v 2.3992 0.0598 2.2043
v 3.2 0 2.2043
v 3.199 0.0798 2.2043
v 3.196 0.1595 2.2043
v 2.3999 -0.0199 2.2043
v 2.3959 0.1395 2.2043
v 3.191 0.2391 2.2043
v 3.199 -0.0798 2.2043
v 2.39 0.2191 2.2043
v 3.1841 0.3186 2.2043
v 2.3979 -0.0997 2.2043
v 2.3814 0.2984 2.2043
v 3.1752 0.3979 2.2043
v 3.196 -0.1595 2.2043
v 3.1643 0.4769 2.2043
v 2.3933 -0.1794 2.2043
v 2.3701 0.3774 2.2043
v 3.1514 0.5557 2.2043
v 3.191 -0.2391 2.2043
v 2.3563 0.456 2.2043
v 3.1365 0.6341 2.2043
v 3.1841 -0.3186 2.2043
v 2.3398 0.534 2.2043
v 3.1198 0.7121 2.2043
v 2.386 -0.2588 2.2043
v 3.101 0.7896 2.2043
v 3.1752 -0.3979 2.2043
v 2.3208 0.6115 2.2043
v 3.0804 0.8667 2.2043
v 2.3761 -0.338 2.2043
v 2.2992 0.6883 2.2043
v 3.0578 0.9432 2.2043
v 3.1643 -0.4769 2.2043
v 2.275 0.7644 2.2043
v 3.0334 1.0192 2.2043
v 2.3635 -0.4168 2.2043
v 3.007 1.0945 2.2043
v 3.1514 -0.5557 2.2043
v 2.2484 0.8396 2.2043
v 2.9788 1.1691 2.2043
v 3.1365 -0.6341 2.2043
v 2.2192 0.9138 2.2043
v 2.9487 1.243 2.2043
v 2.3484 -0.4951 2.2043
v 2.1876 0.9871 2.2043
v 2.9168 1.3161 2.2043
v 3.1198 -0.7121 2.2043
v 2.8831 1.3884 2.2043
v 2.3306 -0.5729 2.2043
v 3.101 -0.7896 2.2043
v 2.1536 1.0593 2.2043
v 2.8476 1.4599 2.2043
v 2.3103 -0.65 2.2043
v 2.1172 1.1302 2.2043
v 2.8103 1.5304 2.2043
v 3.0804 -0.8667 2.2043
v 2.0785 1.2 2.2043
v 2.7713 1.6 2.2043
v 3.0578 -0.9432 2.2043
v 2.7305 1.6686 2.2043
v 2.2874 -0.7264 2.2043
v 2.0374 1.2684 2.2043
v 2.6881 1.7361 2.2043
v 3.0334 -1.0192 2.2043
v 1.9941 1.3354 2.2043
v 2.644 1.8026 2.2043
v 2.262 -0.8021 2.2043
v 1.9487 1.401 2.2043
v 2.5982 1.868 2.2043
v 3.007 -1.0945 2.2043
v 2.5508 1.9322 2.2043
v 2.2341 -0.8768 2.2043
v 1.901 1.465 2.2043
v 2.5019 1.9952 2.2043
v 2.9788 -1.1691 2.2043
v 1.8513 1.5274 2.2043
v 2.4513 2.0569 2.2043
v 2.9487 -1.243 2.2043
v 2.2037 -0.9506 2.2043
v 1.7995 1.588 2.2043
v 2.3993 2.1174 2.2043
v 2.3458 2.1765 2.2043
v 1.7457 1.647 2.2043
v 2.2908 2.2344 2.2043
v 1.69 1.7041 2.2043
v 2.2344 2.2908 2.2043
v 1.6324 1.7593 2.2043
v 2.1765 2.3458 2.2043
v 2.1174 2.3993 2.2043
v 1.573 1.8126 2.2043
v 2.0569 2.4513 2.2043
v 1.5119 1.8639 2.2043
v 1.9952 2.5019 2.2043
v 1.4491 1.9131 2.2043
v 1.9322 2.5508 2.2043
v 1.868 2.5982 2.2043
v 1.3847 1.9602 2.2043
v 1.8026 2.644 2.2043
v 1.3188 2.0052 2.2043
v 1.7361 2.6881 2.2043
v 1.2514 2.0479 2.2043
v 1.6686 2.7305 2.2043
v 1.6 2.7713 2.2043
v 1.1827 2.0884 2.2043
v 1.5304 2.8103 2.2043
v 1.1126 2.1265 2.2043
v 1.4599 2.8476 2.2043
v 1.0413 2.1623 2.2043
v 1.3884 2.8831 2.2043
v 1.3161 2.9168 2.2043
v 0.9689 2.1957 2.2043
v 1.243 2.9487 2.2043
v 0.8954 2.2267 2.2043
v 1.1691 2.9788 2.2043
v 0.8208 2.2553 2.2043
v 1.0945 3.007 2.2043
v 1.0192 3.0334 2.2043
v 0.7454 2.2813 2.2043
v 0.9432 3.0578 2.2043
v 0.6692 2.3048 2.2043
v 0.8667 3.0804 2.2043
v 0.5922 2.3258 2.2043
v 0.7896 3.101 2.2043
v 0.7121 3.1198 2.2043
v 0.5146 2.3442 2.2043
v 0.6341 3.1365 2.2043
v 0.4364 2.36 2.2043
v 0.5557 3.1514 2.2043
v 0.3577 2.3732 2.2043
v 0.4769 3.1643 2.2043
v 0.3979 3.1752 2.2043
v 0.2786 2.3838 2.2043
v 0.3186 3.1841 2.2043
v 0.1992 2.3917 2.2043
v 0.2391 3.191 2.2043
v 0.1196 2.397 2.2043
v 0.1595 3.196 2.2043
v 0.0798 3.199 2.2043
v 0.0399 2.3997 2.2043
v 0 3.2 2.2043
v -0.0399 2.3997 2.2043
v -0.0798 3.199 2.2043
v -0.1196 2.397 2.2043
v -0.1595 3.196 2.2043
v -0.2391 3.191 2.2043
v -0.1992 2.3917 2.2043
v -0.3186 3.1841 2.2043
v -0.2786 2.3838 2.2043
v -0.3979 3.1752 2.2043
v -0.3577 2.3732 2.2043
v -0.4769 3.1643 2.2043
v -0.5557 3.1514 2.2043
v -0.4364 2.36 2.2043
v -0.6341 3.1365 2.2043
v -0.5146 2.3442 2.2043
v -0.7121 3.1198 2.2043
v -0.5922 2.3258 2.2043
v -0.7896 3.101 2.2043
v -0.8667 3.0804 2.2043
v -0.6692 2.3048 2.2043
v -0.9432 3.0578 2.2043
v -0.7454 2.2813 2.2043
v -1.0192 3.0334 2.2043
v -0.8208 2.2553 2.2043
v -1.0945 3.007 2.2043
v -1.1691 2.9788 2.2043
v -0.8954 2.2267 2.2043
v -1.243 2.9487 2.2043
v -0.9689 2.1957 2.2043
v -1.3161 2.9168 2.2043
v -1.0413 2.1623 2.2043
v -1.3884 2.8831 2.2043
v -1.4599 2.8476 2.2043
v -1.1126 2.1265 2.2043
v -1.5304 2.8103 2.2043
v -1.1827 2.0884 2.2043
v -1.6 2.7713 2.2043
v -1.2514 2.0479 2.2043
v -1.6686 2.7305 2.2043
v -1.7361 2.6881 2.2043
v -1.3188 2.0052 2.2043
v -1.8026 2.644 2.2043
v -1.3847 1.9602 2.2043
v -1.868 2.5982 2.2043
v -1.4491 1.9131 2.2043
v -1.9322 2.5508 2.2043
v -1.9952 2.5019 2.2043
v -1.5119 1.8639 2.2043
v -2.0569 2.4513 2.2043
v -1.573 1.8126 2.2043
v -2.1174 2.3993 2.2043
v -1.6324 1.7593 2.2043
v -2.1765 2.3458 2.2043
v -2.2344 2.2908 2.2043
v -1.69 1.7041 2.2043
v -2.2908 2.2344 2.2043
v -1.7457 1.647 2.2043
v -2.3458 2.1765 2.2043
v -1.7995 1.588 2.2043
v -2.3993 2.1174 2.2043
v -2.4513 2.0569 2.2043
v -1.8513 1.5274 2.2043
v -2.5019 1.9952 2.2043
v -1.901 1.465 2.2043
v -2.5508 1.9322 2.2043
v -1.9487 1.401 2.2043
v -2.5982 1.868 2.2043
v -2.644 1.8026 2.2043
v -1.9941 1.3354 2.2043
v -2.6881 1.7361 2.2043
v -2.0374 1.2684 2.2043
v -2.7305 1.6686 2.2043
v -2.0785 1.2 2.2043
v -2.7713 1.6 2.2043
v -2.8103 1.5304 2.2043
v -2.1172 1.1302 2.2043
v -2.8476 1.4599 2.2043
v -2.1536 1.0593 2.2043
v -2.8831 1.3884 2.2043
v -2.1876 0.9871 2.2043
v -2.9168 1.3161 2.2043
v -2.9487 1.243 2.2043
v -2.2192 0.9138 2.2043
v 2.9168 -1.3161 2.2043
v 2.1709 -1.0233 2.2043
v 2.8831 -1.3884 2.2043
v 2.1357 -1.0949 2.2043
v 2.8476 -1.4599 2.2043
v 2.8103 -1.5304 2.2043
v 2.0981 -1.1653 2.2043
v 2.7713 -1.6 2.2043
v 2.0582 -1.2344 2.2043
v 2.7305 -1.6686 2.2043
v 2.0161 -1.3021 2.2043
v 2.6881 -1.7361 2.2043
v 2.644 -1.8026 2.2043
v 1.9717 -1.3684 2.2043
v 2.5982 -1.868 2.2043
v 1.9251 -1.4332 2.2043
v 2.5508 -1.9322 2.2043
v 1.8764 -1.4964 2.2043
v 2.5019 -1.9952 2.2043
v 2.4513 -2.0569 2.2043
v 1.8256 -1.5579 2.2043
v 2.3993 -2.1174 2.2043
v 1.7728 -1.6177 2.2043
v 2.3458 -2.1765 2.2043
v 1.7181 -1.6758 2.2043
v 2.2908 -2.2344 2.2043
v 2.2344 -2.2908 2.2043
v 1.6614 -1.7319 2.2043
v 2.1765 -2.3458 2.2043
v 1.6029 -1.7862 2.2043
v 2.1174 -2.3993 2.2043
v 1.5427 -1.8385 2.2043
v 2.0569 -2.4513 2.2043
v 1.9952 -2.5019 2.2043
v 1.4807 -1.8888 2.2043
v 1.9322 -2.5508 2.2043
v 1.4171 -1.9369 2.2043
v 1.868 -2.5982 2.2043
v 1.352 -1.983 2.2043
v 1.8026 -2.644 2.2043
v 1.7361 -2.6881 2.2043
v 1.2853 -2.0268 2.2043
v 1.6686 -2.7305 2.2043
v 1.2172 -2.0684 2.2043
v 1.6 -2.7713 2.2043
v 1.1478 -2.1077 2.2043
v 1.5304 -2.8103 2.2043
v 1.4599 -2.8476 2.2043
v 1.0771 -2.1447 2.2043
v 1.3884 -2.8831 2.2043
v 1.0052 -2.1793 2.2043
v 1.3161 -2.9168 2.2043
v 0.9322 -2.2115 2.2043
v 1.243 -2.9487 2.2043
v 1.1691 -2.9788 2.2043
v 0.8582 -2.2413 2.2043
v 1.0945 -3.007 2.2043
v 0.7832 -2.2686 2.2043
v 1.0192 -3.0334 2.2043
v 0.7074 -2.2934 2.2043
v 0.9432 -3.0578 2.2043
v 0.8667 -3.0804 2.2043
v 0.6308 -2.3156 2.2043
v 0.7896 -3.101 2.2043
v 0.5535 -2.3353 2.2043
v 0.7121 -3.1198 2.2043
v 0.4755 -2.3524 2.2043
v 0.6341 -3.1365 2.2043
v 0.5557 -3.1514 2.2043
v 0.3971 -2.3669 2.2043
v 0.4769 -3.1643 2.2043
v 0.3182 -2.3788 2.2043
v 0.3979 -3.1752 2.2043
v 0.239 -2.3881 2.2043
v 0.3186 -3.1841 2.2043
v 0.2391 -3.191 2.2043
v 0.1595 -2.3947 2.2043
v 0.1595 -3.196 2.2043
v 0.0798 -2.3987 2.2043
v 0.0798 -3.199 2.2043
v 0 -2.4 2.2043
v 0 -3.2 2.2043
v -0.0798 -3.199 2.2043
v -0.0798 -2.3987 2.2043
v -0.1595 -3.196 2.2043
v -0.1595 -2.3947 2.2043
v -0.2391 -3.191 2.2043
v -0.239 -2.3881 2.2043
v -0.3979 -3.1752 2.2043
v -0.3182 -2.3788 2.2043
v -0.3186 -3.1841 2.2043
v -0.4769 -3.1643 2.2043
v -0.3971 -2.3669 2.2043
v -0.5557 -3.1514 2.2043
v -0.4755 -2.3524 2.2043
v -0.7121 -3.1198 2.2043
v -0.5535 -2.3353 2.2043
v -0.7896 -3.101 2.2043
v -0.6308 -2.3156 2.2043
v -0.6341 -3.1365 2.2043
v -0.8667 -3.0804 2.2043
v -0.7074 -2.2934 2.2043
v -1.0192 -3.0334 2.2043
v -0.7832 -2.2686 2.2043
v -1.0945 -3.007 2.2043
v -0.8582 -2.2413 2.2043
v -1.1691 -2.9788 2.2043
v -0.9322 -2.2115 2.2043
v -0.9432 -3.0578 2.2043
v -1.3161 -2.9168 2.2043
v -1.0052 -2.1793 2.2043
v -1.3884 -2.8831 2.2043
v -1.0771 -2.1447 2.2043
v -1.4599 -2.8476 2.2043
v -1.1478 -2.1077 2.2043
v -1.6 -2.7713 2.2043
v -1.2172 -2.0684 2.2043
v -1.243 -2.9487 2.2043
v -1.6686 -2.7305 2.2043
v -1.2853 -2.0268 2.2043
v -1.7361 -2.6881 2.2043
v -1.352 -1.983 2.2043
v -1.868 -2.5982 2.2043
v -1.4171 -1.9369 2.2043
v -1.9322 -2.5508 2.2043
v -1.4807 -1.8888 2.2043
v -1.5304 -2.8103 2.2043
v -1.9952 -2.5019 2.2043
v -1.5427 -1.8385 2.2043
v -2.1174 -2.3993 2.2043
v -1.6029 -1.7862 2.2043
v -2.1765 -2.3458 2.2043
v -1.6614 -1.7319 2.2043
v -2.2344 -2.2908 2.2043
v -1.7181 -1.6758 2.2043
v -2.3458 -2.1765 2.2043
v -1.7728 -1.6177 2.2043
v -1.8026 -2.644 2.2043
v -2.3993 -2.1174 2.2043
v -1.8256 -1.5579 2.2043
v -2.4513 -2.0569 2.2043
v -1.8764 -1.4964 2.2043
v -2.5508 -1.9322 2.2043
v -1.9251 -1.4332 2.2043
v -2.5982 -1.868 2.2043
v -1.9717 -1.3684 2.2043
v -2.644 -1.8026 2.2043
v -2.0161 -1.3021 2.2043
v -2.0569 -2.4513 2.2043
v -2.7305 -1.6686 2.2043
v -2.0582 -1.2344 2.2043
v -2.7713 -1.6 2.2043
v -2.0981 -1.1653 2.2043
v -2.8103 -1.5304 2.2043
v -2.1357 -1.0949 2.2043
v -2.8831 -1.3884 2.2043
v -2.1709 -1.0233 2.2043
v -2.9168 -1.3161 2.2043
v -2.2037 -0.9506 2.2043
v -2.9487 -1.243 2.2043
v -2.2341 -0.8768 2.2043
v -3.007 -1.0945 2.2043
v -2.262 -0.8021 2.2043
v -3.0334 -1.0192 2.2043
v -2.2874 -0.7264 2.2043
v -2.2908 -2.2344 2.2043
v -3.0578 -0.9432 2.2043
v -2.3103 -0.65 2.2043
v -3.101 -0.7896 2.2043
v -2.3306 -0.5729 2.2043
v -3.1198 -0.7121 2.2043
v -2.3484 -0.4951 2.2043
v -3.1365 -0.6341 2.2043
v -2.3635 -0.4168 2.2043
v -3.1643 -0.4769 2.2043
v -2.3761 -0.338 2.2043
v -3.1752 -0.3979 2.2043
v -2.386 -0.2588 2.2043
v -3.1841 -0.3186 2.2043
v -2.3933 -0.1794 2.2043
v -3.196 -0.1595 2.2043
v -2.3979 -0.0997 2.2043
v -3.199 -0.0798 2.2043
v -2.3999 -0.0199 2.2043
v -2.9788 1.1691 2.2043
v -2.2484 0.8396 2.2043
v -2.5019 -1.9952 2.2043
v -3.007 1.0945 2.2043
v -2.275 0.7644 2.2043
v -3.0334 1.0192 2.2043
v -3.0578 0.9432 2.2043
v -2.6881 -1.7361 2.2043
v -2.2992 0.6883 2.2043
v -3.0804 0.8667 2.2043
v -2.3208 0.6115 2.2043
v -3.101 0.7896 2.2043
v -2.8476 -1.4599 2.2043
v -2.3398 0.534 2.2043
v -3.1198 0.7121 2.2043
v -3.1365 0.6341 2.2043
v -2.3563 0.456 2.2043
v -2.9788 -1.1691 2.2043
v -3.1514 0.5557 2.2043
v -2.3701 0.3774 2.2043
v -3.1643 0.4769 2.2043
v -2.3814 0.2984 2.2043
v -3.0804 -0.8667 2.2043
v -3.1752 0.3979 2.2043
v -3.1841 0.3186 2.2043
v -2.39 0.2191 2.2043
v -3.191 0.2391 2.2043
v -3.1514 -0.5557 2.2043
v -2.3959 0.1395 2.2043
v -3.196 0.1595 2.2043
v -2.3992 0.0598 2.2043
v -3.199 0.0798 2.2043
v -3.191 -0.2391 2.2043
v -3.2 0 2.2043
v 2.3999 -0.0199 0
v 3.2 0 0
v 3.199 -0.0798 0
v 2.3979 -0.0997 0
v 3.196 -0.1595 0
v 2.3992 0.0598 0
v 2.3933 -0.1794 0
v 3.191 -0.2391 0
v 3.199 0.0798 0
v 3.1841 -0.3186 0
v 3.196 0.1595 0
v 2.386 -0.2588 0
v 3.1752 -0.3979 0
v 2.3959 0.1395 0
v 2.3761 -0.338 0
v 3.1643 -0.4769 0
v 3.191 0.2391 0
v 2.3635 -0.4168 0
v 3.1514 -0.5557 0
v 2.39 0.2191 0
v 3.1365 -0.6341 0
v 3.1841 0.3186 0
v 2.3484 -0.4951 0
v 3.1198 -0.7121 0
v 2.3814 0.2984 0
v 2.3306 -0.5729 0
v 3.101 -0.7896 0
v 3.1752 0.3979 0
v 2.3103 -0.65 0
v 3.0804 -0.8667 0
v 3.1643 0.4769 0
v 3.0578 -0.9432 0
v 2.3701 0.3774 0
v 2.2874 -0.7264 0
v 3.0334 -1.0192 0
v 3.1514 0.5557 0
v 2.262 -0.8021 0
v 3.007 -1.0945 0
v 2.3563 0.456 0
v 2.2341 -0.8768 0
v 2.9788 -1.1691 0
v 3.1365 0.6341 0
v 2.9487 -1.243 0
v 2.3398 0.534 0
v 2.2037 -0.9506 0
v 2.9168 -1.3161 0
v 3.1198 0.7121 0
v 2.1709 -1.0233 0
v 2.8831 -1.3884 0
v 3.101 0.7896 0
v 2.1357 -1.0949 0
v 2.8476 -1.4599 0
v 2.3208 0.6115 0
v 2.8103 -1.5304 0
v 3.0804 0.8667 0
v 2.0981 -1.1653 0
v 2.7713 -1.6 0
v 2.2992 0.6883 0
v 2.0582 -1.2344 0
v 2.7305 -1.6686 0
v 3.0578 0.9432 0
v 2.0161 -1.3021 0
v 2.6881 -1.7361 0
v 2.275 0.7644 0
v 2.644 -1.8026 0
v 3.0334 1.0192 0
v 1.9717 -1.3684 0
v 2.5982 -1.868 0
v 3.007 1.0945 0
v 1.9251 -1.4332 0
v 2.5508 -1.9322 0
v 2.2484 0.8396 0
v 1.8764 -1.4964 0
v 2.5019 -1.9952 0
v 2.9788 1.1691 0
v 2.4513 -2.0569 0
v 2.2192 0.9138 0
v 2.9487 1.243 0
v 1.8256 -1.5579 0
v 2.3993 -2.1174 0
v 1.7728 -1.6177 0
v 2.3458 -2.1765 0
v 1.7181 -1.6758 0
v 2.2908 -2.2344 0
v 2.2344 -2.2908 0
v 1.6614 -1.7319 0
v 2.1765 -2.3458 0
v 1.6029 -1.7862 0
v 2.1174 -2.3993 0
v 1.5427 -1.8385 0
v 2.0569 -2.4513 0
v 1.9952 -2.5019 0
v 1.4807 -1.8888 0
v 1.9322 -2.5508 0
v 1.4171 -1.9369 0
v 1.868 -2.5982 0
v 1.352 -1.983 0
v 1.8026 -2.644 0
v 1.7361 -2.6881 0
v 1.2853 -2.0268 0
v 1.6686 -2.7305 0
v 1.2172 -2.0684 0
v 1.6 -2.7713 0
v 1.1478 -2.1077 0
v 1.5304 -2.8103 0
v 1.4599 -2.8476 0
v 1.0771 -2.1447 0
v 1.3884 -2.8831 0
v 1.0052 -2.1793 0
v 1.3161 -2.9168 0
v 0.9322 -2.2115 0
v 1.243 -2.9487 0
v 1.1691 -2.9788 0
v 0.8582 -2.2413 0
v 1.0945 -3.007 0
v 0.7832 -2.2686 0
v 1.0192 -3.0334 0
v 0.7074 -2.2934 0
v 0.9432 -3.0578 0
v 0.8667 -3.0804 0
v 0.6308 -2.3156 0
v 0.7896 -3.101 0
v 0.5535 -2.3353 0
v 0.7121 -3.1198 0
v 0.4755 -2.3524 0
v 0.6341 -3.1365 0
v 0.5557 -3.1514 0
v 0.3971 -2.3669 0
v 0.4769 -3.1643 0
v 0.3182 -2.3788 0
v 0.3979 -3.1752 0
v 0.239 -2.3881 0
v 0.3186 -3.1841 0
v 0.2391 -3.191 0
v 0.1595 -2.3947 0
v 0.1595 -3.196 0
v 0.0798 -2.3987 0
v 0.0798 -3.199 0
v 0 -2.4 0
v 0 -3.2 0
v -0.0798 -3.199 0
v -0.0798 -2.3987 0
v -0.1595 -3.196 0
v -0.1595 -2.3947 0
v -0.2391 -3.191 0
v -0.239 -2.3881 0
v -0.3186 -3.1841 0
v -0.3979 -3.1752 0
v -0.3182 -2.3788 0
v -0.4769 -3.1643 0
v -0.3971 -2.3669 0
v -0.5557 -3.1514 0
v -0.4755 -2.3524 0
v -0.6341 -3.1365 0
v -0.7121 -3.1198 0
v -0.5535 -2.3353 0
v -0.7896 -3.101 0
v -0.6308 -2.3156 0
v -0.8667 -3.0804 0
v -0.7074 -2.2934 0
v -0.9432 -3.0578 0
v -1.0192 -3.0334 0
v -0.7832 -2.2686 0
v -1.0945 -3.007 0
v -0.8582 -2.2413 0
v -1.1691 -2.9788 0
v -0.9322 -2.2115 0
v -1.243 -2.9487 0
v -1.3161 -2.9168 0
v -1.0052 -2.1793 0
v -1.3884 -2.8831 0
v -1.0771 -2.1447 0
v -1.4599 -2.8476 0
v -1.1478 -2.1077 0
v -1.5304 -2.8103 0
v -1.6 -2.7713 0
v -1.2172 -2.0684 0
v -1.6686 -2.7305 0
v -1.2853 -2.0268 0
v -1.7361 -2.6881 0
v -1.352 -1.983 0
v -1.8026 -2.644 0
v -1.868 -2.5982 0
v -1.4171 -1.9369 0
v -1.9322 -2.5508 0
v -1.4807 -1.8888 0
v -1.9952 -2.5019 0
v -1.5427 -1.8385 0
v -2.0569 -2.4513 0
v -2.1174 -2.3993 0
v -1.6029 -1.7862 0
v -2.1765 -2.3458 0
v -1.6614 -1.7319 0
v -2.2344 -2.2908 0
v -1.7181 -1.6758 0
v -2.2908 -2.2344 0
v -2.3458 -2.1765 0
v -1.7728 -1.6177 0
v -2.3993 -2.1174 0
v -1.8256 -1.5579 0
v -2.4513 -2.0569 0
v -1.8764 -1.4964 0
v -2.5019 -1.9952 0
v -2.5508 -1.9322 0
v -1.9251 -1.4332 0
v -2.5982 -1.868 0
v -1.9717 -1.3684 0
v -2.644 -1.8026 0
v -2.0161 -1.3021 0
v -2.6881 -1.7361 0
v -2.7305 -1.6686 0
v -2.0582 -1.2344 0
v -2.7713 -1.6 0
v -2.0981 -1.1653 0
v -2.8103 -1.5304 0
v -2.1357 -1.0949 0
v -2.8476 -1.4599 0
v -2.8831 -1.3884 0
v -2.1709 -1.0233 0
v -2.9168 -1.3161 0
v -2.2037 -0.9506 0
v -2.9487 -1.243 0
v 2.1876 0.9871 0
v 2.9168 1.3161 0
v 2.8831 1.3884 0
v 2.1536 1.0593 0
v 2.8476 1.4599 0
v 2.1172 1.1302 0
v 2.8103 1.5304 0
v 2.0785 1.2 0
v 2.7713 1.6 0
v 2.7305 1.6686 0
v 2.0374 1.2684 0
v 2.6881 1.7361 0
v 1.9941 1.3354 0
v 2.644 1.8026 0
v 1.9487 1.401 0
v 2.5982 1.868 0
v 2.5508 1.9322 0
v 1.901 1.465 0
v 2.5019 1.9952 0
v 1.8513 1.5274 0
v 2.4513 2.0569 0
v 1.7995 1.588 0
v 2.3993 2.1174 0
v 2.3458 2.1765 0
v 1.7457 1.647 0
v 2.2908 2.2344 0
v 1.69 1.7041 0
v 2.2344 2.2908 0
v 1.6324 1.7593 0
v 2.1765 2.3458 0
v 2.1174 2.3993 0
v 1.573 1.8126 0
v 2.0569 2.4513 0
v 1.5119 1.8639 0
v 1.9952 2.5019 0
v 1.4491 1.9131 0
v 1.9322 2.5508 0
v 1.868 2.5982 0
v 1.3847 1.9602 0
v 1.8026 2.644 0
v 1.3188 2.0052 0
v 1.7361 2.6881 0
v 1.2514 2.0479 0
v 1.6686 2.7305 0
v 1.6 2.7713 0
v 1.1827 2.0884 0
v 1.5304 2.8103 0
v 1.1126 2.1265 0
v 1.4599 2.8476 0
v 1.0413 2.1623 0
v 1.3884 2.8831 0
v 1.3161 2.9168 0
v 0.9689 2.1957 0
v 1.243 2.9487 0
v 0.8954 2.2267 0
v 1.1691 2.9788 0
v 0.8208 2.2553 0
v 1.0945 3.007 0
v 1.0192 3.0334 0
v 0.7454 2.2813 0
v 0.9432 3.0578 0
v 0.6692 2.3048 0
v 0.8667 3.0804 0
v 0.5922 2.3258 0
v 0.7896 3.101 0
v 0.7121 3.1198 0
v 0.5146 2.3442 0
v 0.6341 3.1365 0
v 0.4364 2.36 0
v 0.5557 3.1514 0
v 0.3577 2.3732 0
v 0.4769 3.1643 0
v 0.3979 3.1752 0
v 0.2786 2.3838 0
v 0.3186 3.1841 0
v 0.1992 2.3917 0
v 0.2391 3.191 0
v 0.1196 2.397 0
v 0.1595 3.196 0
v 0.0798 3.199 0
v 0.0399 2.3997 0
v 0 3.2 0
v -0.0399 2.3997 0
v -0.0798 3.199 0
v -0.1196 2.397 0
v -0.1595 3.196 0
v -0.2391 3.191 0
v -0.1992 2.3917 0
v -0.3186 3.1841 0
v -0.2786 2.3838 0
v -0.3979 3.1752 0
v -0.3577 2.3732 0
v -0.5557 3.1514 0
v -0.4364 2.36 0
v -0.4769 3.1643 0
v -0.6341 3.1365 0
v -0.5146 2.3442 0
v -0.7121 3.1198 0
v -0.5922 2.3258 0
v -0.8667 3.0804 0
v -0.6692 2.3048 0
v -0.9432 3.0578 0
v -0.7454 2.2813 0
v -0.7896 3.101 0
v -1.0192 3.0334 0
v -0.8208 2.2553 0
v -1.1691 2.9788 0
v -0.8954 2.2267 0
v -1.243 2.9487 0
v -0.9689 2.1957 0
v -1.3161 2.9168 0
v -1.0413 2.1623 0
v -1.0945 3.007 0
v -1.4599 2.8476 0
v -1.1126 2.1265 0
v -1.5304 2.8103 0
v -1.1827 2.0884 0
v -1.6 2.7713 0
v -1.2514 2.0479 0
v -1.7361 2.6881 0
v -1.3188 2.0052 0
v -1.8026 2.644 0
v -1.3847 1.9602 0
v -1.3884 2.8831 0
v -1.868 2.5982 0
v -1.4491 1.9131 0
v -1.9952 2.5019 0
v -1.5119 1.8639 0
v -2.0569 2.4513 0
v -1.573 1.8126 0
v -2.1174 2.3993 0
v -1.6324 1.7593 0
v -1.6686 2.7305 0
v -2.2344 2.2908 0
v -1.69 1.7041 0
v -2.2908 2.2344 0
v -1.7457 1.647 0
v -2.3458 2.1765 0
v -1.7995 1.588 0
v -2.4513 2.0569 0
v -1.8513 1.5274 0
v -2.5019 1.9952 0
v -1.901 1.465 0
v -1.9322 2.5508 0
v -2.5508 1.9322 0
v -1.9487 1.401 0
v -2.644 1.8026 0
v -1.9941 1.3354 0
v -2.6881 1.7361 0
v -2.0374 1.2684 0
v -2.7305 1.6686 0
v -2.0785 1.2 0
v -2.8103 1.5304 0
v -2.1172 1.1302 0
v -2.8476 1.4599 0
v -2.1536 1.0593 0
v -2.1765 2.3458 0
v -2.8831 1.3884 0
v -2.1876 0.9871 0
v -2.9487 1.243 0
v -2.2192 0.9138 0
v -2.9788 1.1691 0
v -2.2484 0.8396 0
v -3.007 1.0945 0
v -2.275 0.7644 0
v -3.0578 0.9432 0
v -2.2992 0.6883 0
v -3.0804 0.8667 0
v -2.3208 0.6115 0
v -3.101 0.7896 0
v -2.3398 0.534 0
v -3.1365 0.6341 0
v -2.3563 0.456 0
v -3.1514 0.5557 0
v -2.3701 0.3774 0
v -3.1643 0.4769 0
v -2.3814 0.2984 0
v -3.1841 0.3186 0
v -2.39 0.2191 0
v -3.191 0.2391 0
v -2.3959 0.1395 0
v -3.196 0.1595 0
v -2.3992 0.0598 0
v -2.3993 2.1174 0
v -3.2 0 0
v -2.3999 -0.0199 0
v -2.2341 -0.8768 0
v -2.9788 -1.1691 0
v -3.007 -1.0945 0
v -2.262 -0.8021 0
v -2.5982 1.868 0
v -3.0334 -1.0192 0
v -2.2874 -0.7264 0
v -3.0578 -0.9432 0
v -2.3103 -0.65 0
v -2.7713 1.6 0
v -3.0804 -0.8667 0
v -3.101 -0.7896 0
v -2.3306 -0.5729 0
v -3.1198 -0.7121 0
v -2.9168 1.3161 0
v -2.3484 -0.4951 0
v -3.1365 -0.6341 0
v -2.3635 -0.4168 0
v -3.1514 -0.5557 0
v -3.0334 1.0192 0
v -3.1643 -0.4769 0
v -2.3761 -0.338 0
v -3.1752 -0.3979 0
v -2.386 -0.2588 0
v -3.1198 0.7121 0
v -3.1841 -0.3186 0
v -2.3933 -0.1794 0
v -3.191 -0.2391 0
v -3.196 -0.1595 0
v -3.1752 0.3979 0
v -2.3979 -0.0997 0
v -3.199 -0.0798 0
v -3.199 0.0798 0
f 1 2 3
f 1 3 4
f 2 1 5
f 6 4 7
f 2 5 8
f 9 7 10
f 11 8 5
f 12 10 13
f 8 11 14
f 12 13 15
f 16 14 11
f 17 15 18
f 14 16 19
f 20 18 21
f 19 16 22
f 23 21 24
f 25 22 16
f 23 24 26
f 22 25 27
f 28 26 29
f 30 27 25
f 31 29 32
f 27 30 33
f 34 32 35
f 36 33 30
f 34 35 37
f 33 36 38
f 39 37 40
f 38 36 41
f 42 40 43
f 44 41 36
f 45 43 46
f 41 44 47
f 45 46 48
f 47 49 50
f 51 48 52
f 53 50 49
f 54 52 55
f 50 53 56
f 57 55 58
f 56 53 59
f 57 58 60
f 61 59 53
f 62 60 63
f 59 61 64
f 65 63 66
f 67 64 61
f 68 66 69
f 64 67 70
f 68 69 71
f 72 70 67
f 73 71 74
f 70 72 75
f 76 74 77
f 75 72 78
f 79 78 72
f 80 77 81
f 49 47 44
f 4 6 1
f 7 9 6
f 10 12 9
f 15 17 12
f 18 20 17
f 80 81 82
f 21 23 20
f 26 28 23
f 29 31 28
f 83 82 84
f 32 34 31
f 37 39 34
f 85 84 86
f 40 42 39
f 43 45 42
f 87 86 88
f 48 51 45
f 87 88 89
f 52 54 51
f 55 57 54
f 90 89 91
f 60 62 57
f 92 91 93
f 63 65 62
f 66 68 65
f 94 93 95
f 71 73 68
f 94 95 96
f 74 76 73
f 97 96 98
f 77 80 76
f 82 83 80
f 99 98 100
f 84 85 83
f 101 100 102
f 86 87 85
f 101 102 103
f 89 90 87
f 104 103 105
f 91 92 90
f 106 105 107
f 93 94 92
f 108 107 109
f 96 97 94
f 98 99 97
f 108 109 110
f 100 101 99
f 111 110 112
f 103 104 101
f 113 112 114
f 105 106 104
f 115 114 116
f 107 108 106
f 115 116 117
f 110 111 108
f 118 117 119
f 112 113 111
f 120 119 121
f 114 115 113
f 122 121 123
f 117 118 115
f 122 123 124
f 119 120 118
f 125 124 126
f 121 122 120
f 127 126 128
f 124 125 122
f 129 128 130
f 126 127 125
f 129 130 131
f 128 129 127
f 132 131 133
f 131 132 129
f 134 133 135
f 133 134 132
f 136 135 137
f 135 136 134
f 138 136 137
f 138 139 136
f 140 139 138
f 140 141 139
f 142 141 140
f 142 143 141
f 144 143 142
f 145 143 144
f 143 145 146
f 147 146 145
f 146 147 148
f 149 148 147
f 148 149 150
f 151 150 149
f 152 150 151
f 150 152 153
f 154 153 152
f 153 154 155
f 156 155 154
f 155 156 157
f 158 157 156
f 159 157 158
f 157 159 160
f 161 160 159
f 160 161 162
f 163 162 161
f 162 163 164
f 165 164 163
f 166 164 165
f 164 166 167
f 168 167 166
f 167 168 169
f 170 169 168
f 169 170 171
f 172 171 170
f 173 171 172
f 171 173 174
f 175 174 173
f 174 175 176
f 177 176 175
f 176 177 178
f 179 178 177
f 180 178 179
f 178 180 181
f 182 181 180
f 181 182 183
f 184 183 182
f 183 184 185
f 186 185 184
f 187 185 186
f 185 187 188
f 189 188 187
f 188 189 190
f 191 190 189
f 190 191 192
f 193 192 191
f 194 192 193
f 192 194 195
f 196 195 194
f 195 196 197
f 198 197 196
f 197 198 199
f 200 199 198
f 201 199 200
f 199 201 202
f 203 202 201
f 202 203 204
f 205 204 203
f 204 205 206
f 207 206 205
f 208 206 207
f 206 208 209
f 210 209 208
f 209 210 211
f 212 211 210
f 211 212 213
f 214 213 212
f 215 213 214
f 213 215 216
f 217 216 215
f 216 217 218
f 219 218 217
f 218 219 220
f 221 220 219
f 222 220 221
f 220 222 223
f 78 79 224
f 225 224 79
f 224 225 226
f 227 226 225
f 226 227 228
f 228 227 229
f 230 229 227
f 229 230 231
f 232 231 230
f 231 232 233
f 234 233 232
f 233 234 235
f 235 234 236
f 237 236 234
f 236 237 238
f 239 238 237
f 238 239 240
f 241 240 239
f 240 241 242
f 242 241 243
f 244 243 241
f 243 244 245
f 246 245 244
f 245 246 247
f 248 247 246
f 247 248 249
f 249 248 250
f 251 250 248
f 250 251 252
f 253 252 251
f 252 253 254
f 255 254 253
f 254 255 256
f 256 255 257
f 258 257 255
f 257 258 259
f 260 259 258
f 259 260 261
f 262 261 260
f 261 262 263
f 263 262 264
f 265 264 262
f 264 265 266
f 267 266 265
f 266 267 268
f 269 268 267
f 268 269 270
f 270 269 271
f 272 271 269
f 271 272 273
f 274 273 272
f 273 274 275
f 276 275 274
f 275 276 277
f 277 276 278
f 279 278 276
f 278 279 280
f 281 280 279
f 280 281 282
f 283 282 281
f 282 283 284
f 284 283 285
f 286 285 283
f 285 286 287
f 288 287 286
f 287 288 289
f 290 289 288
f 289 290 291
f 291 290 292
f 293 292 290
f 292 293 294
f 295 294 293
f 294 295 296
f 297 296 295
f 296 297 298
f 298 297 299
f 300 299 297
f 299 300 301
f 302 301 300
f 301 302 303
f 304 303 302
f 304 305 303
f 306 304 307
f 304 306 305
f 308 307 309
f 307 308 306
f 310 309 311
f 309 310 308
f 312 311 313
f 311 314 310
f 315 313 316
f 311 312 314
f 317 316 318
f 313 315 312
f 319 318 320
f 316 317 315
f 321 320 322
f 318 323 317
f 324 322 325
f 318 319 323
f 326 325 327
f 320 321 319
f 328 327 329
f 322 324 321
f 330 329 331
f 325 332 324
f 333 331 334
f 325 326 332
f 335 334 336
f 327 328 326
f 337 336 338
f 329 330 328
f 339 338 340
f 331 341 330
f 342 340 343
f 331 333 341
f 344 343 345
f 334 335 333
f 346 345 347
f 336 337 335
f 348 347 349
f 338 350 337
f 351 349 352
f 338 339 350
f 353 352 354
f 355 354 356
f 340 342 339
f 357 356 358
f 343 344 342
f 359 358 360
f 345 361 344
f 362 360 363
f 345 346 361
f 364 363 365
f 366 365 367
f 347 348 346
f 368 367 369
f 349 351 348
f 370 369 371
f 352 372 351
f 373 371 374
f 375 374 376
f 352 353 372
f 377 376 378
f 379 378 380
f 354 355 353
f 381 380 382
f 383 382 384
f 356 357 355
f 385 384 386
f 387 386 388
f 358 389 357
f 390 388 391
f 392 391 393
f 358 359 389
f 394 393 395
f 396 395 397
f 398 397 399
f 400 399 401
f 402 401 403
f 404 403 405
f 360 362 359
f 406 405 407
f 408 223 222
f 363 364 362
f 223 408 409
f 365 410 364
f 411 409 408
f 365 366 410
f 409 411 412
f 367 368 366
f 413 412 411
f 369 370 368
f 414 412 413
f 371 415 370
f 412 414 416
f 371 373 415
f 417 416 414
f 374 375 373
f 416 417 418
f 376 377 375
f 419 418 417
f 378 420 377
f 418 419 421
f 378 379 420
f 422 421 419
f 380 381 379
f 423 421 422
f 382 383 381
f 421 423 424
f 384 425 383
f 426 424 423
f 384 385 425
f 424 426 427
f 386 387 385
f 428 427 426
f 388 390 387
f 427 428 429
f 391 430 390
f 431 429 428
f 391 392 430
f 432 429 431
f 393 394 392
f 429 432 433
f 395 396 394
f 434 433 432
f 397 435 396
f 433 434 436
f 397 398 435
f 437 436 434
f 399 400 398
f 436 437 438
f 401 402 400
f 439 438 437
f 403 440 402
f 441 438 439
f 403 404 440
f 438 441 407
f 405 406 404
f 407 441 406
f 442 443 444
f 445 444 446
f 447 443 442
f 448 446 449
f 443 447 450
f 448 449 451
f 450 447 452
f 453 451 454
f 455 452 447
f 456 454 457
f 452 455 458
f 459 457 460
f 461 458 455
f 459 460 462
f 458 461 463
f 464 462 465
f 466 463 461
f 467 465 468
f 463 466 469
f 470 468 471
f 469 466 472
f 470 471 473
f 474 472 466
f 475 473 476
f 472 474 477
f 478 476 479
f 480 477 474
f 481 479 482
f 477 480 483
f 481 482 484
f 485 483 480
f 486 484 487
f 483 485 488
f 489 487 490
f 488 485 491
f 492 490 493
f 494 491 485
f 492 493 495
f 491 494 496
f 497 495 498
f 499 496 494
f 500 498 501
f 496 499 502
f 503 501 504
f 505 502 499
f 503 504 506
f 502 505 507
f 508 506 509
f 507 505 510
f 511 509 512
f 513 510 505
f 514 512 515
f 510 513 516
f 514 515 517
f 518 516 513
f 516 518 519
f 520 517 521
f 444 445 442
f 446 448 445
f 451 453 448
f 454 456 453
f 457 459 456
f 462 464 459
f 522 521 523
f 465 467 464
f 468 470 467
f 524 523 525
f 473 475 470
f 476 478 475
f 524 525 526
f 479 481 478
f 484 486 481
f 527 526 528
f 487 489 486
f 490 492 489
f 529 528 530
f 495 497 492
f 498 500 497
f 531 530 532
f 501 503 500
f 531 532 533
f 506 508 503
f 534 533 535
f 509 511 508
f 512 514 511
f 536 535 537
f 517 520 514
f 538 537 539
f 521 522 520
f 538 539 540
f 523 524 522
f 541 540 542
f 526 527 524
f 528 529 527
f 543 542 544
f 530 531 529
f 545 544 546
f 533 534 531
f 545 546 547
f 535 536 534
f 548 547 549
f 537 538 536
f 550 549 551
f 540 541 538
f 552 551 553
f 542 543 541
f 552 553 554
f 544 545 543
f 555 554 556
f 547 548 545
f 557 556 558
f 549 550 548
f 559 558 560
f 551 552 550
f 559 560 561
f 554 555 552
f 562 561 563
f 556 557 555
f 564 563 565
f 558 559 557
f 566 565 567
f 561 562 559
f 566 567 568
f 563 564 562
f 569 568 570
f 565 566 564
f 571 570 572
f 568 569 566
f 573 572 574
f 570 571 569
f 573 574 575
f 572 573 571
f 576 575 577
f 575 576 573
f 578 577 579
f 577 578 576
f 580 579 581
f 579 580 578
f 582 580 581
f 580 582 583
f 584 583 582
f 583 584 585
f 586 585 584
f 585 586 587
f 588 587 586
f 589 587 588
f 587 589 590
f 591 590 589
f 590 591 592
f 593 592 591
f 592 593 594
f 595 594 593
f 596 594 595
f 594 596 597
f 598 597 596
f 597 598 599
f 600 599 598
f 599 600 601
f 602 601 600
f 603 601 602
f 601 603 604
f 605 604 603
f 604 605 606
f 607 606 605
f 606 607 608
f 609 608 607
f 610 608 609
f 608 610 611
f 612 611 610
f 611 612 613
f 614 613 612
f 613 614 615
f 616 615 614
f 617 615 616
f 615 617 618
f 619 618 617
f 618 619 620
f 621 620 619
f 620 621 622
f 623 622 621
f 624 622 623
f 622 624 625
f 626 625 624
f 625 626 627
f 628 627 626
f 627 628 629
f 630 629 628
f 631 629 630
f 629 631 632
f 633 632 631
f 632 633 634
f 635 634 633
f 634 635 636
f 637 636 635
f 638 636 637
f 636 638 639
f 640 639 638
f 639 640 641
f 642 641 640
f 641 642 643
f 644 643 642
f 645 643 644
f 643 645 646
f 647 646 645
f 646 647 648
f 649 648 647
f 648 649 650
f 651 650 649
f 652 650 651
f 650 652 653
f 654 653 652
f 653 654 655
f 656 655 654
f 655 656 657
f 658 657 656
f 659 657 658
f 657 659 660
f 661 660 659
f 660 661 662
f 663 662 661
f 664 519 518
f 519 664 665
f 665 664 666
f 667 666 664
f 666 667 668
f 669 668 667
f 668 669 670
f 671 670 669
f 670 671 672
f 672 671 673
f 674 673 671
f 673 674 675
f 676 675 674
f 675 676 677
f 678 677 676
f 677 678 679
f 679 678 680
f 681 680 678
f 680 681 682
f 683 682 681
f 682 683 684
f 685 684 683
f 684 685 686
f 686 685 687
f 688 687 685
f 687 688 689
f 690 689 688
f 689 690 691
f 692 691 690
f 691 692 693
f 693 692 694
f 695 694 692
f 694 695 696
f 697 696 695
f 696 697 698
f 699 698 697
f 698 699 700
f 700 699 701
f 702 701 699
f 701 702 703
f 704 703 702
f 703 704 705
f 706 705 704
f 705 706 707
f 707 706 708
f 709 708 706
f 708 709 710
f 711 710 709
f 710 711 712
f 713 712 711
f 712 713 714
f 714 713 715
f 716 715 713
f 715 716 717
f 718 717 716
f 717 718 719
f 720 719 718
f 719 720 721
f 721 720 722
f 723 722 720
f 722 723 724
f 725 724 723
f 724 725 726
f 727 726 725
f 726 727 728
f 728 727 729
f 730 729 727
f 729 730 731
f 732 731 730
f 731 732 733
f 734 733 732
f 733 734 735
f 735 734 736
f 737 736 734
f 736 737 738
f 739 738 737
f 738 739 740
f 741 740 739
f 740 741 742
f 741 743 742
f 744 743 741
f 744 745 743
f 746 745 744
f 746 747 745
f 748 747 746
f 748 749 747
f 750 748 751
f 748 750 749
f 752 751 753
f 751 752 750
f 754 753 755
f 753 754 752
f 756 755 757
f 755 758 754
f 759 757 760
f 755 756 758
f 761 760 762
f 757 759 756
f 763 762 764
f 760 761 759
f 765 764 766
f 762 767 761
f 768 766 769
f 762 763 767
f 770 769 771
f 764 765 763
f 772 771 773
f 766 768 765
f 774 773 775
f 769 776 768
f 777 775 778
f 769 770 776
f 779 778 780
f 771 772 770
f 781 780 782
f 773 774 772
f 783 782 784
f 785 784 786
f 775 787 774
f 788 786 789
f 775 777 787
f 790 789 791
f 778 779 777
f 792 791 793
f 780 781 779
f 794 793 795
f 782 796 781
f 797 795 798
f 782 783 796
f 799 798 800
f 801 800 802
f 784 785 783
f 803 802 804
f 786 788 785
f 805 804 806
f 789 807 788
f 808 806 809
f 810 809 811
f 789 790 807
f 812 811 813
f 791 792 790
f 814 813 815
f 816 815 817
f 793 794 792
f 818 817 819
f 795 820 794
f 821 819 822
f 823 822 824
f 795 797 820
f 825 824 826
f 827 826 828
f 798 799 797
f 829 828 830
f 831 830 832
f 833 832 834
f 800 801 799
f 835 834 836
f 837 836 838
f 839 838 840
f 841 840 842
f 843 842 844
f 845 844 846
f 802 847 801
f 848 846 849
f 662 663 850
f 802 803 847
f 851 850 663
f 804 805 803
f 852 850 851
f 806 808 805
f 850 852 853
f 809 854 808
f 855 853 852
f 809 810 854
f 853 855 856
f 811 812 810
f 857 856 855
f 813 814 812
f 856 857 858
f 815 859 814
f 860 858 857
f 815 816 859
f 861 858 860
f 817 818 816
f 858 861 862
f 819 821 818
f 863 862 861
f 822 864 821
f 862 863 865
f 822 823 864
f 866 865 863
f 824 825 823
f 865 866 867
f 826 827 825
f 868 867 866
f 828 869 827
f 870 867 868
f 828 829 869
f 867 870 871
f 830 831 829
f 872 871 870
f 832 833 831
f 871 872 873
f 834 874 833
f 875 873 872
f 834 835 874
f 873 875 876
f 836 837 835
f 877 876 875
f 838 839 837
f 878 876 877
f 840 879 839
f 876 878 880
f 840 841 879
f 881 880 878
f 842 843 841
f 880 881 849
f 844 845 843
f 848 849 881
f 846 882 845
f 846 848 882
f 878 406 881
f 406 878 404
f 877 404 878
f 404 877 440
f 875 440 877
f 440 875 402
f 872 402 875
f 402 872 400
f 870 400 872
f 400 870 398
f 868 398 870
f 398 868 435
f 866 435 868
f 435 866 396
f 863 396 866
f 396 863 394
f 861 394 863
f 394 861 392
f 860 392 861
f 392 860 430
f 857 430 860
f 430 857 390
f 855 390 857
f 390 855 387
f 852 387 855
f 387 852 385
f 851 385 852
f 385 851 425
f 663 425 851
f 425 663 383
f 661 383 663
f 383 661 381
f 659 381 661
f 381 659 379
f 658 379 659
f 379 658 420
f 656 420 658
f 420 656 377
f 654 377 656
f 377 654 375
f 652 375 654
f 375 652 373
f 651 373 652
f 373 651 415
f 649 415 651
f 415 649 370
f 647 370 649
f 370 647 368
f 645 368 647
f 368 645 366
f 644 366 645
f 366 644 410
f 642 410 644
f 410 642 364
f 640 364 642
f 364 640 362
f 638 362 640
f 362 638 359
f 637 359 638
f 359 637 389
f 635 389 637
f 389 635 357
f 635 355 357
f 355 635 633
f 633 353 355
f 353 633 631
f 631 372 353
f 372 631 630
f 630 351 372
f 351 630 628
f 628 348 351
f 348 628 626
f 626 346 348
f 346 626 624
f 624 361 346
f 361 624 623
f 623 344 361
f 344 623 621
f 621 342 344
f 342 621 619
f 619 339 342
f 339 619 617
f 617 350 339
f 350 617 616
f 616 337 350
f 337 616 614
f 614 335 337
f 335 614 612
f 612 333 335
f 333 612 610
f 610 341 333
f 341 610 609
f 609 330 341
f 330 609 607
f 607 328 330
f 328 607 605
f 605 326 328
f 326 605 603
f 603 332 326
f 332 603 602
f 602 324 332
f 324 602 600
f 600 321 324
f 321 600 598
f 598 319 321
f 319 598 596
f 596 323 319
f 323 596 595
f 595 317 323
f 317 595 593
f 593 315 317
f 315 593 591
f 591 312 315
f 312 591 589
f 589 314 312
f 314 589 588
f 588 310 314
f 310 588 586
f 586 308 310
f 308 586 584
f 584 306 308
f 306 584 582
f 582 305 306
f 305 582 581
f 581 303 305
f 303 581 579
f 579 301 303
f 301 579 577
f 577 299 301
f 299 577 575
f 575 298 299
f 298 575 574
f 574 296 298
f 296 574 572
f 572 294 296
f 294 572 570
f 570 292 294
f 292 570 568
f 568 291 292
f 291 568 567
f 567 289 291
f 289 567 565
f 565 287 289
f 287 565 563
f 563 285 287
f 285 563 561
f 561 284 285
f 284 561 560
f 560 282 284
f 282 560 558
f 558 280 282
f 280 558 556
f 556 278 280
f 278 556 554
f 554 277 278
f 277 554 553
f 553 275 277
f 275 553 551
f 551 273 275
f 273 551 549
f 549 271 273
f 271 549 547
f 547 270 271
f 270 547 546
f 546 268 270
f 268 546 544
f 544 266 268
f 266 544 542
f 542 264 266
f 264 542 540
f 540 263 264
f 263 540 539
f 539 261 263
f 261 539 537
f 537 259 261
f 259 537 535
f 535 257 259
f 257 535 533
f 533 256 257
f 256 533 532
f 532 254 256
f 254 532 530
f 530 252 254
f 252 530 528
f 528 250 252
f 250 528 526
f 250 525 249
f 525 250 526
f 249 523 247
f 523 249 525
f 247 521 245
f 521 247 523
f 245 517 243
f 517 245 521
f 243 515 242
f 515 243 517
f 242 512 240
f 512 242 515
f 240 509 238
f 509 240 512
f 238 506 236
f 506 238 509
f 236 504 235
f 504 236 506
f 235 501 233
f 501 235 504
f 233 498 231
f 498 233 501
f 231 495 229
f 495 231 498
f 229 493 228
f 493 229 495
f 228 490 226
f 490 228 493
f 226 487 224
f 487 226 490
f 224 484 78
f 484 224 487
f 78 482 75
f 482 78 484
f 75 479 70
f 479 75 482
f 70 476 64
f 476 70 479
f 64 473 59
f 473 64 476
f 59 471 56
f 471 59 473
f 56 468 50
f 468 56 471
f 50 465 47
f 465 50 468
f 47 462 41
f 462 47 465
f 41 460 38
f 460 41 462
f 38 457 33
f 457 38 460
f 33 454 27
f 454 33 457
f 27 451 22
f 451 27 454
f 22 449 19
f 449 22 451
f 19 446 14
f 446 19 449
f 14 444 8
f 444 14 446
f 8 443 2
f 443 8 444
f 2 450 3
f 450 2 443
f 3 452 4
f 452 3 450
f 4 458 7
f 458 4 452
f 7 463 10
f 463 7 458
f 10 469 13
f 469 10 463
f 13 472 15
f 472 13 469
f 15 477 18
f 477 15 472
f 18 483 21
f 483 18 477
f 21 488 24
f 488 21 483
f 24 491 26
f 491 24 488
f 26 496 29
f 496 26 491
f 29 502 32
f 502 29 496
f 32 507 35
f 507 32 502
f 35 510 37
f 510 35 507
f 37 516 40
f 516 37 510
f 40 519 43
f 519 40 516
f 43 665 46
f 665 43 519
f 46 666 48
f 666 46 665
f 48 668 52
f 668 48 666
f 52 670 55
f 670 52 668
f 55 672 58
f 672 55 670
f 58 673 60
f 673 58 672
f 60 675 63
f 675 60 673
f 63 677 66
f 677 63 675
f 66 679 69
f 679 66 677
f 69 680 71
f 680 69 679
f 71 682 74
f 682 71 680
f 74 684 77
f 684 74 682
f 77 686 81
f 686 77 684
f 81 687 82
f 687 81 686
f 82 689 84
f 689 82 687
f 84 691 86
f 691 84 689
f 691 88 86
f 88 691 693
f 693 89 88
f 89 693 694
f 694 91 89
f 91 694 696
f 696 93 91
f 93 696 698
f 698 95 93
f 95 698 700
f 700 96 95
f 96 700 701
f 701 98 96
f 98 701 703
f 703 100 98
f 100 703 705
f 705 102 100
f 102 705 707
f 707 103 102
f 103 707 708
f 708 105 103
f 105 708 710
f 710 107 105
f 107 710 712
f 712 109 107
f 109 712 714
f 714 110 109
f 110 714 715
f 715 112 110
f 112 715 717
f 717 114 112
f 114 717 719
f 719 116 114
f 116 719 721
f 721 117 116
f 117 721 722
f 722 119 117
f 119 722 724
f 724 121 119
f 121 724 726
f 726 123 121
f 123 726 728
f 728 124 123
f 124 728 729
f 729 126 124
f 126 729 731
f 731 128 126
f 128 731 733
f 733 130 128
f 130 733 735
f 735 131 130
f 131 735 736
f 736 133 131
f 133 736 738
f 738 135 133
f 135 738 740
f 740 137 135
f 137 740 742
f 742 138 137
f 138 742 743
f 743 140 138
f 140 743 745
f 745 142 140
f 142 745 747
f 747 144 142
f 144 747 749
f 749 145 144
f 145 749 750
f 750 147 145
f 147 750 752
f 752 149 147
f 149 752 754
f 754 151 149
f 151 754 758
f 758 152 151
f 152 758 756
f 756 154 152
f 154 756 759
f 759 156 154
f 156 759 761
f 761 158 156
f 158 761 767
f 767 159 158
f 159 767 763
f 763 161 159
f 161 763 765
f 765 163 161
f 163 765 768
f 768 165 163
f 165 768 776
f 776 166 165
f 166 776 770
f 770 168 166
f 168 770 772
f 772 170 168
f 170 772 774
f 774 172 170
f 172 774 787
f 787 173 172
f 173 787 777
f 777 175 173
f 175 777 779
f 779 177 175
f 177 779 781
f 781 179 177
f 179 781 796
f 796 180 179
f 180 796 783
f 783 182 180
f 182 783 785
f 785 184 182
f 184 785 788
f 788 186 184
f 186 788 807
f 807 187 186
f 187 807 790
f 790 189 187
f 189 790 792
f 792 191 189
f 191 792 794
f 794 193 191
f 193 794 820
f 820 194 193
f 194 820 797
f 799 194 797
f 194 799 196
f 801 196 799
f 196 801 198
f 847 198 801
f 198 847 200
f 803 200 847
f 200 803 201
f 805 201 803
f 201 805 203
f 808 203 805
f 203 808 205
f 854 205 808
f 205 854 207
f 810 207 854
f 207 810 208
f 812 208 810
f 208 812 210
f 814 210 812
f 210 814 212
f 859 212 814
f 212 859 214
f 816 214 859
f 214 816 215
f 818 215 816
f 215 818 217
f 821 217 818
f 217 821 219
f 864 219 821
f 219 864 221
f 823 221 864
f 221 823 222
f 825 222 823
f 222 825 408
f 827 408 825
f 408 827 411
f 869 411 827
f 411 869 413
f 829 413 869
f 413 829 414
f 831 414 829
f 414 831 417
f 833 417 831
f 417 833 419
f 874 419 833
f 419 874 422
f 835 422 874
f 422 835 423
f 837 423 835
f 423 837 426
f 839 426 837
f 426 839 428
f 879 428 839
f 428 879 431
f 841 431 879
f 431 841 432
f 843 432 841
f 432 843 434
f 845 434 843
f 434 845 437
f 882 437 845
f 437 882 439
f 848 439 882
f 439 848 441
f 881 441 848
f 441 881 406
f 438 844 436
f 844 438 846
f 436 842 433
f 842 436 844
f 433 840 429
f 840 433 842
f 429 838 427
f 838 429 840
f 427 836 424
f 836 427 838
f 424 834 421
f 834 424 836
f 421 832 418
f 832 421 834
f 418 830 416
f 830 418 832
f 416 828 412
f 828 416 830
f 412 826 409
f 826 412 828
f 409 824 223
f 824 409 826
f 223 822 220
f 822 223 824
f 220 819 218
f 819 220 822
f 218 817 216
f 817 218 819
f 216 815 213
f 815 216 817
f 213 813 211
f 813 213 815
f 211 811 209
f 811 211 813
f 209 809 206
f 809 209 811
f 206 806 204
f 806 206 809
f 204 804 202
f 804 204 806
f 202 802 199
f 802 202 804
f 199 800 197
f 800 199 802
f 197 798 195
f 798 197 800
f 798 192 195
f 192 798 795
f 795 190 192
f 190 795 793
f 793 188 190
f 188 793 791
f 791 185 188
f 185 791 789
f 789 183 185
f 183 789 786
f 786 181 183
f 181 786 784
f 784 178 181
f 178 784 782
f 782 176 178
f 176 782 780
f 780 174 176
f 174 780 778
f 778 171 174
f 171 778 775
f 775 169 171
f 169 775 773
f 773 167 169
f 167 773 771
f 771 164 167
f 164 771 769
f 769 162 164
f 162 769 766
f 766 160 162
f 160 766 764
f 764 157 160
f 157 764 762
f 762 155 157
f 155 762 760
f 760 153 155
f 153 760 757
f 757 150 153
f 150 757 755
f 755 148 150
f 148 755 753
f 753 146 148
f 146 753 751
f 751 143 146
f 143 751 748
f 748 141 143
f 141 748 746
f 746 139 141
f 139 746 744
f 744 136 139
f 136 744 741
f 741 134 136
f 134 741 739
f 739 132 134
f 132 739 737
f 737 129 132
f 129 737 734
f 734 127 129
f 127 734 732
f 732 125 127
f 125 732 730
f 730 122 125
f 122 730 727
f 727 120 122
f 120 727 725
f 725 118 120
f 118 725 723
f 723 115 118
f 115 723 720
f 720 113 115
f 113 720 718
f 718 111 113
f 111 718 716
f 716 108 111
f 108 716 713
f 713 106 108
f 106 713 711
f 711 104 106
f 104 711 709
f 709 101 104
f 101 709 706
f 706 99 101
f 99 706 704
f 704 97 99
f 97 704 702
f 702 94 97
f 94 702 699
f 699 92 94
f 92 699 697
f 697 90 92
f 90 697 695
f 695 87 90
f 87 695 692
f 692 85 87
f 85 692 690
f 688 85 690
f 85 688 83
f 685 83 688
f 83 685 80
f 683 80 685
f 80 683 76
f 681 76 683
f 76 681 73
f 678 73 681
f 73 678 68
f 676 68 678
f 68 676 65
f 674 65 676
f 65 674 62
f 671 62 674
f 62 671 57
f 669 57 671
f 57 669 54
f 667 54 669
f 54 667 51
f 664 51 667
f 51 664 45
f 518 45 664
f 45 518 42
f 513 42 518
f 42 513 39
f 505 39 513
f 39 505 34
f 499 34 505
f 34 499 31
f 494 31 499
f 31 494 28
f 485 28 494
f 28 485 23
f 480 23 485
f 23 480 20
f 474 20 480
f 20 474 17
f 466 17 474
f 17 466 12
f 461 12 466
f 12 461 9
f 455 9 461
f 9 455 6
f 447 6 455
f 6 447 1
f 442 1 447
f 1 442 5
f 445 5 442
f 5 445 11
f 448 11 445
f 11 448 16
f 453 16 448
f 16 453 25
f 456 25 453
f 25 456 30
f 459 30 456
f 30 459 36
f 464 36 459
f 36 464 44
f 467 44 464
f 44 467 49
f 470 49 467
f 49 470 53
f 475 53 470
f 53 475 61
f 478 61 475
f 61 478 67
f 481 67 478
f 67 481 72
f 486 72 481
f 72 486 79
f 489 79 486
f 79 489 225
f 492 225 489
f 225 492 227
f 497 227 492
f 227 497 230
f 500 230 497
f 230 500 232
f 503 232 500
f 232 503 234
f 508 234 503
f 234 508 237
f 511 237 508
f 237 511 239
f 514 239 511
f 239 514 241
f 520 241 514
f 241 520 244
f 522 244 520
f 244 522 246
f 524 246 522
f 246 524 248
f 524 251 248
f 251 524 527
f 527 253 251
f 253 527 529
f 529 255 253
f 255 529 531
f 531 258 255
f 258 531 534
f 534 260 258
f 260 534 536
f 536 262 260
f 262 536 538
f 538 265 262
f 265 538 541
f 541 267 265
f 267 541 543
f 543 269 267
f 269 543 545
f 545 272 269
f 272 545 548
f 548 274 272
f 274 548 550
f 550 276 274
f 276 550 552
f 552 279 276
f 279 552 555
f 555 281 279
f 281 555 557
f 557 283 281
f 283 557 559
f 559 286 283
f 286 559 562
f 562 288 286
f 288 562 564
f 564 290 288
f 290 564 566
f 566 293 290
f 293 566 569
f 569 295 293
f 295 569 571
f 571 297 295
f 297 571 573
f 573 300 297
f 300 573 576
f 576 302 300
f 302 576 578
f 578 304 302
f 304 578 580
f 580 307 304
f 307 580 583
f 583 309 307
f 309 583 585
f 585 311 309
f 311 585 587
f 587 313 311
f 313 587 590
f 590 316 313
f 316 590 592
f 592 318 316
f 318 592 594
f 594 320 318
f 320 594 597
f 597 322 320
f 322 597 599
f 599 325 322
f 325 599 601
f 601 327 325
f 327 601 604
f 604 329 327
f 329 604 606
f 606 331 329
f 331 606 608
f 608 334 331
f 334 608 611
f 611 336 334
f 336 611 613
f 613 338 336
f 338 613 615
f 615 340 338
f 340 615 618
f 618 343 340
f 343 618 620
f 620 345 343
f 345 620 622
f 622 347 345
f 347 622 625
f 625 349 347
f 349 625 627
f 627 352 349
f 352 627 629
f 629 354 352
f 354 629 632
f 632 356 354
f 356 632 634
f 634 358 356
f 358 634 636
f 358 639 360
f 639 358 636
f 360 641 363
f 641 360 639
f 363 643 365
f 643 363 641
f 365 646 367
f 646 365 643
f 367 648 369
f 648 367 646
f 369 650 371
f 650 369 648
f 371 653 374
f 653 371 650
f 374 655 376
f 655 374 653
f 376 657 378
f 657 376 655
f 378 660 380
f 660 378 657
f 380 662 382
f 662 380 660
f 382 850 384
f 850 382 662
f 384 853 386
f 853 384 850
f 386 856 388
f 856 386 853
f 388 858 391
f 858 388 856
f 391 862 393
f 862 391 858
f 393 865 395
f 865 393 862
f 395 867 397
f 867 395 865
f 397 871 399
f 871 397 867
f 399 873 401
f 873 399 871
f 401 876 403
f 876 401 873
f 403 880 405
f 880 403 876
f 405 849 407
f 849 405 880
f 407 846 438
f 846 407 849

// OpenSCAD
use <../../lib.scad>
use <49661p01s02.scad>
use <49661s01.scad>
$fa=1; $fs=0.2;
function ldraw_lib__s__49661p01s01(realsolid=false) = [
// 0 ~Animal Duckling with Black Eye with White Pupil Pattern without Beak
// 0 Name: s\49661p01s01.dat
// 0 Author: Gerald Lasser [GeraldLasser]
// 0 !LDRAW_ORG Subpart UPDATE 2020-03
// 0 !LICENSE Licensed under CC BY 2.0 and CC BY 4.0 : see CAreadme.txt
// 
// 0 BFC CERTIFY CCW
  [0,"BFC","CERTIFY"],
  [0,"BFC","CCW"],
// 
// 0 !HISTORY 2020-12-29 [PTadmin] Official Update 2020-03
// 
// 
// 1 16 0 0 0 1 0 0 0 1 0 0 0 1 s\49661s01.dat
  [1,16,0,0,0,1,0,0,0,1,0,0,0,1, ldraw_lib__s__49661s01(realsolid)],
// 
// 1 16 0 0 0 1 0 0 0 1 0 0 0 1 s\49661p01s02.dat
  [1,16,0,0,0,1,0,0,0,1,0,0,0,1, ldraw_lib__s__49661p01s02(realsolid)],
// 1 16 0 0 0 -1 0 0 0 1 0 0 0 1 s\49661p01s02.dat
  [1,16,0,0,0,-1,0,0,0,1,0,0,0,1, ldraw_lib__s__49661p01s02(realsolid)],
];
module ldraw_lib__s__49661p01s01(step=0, col=false, unit=2/5, alt=false, line=0.2, solid=!$preview)
    makepoly(ldraw_lib__s__49661p01s01(solid), step=step, col=col, unit=unit, alt=alt, line=line, solid=solid);
ldraw_lib__s__49661p01s01(line=0.2);
